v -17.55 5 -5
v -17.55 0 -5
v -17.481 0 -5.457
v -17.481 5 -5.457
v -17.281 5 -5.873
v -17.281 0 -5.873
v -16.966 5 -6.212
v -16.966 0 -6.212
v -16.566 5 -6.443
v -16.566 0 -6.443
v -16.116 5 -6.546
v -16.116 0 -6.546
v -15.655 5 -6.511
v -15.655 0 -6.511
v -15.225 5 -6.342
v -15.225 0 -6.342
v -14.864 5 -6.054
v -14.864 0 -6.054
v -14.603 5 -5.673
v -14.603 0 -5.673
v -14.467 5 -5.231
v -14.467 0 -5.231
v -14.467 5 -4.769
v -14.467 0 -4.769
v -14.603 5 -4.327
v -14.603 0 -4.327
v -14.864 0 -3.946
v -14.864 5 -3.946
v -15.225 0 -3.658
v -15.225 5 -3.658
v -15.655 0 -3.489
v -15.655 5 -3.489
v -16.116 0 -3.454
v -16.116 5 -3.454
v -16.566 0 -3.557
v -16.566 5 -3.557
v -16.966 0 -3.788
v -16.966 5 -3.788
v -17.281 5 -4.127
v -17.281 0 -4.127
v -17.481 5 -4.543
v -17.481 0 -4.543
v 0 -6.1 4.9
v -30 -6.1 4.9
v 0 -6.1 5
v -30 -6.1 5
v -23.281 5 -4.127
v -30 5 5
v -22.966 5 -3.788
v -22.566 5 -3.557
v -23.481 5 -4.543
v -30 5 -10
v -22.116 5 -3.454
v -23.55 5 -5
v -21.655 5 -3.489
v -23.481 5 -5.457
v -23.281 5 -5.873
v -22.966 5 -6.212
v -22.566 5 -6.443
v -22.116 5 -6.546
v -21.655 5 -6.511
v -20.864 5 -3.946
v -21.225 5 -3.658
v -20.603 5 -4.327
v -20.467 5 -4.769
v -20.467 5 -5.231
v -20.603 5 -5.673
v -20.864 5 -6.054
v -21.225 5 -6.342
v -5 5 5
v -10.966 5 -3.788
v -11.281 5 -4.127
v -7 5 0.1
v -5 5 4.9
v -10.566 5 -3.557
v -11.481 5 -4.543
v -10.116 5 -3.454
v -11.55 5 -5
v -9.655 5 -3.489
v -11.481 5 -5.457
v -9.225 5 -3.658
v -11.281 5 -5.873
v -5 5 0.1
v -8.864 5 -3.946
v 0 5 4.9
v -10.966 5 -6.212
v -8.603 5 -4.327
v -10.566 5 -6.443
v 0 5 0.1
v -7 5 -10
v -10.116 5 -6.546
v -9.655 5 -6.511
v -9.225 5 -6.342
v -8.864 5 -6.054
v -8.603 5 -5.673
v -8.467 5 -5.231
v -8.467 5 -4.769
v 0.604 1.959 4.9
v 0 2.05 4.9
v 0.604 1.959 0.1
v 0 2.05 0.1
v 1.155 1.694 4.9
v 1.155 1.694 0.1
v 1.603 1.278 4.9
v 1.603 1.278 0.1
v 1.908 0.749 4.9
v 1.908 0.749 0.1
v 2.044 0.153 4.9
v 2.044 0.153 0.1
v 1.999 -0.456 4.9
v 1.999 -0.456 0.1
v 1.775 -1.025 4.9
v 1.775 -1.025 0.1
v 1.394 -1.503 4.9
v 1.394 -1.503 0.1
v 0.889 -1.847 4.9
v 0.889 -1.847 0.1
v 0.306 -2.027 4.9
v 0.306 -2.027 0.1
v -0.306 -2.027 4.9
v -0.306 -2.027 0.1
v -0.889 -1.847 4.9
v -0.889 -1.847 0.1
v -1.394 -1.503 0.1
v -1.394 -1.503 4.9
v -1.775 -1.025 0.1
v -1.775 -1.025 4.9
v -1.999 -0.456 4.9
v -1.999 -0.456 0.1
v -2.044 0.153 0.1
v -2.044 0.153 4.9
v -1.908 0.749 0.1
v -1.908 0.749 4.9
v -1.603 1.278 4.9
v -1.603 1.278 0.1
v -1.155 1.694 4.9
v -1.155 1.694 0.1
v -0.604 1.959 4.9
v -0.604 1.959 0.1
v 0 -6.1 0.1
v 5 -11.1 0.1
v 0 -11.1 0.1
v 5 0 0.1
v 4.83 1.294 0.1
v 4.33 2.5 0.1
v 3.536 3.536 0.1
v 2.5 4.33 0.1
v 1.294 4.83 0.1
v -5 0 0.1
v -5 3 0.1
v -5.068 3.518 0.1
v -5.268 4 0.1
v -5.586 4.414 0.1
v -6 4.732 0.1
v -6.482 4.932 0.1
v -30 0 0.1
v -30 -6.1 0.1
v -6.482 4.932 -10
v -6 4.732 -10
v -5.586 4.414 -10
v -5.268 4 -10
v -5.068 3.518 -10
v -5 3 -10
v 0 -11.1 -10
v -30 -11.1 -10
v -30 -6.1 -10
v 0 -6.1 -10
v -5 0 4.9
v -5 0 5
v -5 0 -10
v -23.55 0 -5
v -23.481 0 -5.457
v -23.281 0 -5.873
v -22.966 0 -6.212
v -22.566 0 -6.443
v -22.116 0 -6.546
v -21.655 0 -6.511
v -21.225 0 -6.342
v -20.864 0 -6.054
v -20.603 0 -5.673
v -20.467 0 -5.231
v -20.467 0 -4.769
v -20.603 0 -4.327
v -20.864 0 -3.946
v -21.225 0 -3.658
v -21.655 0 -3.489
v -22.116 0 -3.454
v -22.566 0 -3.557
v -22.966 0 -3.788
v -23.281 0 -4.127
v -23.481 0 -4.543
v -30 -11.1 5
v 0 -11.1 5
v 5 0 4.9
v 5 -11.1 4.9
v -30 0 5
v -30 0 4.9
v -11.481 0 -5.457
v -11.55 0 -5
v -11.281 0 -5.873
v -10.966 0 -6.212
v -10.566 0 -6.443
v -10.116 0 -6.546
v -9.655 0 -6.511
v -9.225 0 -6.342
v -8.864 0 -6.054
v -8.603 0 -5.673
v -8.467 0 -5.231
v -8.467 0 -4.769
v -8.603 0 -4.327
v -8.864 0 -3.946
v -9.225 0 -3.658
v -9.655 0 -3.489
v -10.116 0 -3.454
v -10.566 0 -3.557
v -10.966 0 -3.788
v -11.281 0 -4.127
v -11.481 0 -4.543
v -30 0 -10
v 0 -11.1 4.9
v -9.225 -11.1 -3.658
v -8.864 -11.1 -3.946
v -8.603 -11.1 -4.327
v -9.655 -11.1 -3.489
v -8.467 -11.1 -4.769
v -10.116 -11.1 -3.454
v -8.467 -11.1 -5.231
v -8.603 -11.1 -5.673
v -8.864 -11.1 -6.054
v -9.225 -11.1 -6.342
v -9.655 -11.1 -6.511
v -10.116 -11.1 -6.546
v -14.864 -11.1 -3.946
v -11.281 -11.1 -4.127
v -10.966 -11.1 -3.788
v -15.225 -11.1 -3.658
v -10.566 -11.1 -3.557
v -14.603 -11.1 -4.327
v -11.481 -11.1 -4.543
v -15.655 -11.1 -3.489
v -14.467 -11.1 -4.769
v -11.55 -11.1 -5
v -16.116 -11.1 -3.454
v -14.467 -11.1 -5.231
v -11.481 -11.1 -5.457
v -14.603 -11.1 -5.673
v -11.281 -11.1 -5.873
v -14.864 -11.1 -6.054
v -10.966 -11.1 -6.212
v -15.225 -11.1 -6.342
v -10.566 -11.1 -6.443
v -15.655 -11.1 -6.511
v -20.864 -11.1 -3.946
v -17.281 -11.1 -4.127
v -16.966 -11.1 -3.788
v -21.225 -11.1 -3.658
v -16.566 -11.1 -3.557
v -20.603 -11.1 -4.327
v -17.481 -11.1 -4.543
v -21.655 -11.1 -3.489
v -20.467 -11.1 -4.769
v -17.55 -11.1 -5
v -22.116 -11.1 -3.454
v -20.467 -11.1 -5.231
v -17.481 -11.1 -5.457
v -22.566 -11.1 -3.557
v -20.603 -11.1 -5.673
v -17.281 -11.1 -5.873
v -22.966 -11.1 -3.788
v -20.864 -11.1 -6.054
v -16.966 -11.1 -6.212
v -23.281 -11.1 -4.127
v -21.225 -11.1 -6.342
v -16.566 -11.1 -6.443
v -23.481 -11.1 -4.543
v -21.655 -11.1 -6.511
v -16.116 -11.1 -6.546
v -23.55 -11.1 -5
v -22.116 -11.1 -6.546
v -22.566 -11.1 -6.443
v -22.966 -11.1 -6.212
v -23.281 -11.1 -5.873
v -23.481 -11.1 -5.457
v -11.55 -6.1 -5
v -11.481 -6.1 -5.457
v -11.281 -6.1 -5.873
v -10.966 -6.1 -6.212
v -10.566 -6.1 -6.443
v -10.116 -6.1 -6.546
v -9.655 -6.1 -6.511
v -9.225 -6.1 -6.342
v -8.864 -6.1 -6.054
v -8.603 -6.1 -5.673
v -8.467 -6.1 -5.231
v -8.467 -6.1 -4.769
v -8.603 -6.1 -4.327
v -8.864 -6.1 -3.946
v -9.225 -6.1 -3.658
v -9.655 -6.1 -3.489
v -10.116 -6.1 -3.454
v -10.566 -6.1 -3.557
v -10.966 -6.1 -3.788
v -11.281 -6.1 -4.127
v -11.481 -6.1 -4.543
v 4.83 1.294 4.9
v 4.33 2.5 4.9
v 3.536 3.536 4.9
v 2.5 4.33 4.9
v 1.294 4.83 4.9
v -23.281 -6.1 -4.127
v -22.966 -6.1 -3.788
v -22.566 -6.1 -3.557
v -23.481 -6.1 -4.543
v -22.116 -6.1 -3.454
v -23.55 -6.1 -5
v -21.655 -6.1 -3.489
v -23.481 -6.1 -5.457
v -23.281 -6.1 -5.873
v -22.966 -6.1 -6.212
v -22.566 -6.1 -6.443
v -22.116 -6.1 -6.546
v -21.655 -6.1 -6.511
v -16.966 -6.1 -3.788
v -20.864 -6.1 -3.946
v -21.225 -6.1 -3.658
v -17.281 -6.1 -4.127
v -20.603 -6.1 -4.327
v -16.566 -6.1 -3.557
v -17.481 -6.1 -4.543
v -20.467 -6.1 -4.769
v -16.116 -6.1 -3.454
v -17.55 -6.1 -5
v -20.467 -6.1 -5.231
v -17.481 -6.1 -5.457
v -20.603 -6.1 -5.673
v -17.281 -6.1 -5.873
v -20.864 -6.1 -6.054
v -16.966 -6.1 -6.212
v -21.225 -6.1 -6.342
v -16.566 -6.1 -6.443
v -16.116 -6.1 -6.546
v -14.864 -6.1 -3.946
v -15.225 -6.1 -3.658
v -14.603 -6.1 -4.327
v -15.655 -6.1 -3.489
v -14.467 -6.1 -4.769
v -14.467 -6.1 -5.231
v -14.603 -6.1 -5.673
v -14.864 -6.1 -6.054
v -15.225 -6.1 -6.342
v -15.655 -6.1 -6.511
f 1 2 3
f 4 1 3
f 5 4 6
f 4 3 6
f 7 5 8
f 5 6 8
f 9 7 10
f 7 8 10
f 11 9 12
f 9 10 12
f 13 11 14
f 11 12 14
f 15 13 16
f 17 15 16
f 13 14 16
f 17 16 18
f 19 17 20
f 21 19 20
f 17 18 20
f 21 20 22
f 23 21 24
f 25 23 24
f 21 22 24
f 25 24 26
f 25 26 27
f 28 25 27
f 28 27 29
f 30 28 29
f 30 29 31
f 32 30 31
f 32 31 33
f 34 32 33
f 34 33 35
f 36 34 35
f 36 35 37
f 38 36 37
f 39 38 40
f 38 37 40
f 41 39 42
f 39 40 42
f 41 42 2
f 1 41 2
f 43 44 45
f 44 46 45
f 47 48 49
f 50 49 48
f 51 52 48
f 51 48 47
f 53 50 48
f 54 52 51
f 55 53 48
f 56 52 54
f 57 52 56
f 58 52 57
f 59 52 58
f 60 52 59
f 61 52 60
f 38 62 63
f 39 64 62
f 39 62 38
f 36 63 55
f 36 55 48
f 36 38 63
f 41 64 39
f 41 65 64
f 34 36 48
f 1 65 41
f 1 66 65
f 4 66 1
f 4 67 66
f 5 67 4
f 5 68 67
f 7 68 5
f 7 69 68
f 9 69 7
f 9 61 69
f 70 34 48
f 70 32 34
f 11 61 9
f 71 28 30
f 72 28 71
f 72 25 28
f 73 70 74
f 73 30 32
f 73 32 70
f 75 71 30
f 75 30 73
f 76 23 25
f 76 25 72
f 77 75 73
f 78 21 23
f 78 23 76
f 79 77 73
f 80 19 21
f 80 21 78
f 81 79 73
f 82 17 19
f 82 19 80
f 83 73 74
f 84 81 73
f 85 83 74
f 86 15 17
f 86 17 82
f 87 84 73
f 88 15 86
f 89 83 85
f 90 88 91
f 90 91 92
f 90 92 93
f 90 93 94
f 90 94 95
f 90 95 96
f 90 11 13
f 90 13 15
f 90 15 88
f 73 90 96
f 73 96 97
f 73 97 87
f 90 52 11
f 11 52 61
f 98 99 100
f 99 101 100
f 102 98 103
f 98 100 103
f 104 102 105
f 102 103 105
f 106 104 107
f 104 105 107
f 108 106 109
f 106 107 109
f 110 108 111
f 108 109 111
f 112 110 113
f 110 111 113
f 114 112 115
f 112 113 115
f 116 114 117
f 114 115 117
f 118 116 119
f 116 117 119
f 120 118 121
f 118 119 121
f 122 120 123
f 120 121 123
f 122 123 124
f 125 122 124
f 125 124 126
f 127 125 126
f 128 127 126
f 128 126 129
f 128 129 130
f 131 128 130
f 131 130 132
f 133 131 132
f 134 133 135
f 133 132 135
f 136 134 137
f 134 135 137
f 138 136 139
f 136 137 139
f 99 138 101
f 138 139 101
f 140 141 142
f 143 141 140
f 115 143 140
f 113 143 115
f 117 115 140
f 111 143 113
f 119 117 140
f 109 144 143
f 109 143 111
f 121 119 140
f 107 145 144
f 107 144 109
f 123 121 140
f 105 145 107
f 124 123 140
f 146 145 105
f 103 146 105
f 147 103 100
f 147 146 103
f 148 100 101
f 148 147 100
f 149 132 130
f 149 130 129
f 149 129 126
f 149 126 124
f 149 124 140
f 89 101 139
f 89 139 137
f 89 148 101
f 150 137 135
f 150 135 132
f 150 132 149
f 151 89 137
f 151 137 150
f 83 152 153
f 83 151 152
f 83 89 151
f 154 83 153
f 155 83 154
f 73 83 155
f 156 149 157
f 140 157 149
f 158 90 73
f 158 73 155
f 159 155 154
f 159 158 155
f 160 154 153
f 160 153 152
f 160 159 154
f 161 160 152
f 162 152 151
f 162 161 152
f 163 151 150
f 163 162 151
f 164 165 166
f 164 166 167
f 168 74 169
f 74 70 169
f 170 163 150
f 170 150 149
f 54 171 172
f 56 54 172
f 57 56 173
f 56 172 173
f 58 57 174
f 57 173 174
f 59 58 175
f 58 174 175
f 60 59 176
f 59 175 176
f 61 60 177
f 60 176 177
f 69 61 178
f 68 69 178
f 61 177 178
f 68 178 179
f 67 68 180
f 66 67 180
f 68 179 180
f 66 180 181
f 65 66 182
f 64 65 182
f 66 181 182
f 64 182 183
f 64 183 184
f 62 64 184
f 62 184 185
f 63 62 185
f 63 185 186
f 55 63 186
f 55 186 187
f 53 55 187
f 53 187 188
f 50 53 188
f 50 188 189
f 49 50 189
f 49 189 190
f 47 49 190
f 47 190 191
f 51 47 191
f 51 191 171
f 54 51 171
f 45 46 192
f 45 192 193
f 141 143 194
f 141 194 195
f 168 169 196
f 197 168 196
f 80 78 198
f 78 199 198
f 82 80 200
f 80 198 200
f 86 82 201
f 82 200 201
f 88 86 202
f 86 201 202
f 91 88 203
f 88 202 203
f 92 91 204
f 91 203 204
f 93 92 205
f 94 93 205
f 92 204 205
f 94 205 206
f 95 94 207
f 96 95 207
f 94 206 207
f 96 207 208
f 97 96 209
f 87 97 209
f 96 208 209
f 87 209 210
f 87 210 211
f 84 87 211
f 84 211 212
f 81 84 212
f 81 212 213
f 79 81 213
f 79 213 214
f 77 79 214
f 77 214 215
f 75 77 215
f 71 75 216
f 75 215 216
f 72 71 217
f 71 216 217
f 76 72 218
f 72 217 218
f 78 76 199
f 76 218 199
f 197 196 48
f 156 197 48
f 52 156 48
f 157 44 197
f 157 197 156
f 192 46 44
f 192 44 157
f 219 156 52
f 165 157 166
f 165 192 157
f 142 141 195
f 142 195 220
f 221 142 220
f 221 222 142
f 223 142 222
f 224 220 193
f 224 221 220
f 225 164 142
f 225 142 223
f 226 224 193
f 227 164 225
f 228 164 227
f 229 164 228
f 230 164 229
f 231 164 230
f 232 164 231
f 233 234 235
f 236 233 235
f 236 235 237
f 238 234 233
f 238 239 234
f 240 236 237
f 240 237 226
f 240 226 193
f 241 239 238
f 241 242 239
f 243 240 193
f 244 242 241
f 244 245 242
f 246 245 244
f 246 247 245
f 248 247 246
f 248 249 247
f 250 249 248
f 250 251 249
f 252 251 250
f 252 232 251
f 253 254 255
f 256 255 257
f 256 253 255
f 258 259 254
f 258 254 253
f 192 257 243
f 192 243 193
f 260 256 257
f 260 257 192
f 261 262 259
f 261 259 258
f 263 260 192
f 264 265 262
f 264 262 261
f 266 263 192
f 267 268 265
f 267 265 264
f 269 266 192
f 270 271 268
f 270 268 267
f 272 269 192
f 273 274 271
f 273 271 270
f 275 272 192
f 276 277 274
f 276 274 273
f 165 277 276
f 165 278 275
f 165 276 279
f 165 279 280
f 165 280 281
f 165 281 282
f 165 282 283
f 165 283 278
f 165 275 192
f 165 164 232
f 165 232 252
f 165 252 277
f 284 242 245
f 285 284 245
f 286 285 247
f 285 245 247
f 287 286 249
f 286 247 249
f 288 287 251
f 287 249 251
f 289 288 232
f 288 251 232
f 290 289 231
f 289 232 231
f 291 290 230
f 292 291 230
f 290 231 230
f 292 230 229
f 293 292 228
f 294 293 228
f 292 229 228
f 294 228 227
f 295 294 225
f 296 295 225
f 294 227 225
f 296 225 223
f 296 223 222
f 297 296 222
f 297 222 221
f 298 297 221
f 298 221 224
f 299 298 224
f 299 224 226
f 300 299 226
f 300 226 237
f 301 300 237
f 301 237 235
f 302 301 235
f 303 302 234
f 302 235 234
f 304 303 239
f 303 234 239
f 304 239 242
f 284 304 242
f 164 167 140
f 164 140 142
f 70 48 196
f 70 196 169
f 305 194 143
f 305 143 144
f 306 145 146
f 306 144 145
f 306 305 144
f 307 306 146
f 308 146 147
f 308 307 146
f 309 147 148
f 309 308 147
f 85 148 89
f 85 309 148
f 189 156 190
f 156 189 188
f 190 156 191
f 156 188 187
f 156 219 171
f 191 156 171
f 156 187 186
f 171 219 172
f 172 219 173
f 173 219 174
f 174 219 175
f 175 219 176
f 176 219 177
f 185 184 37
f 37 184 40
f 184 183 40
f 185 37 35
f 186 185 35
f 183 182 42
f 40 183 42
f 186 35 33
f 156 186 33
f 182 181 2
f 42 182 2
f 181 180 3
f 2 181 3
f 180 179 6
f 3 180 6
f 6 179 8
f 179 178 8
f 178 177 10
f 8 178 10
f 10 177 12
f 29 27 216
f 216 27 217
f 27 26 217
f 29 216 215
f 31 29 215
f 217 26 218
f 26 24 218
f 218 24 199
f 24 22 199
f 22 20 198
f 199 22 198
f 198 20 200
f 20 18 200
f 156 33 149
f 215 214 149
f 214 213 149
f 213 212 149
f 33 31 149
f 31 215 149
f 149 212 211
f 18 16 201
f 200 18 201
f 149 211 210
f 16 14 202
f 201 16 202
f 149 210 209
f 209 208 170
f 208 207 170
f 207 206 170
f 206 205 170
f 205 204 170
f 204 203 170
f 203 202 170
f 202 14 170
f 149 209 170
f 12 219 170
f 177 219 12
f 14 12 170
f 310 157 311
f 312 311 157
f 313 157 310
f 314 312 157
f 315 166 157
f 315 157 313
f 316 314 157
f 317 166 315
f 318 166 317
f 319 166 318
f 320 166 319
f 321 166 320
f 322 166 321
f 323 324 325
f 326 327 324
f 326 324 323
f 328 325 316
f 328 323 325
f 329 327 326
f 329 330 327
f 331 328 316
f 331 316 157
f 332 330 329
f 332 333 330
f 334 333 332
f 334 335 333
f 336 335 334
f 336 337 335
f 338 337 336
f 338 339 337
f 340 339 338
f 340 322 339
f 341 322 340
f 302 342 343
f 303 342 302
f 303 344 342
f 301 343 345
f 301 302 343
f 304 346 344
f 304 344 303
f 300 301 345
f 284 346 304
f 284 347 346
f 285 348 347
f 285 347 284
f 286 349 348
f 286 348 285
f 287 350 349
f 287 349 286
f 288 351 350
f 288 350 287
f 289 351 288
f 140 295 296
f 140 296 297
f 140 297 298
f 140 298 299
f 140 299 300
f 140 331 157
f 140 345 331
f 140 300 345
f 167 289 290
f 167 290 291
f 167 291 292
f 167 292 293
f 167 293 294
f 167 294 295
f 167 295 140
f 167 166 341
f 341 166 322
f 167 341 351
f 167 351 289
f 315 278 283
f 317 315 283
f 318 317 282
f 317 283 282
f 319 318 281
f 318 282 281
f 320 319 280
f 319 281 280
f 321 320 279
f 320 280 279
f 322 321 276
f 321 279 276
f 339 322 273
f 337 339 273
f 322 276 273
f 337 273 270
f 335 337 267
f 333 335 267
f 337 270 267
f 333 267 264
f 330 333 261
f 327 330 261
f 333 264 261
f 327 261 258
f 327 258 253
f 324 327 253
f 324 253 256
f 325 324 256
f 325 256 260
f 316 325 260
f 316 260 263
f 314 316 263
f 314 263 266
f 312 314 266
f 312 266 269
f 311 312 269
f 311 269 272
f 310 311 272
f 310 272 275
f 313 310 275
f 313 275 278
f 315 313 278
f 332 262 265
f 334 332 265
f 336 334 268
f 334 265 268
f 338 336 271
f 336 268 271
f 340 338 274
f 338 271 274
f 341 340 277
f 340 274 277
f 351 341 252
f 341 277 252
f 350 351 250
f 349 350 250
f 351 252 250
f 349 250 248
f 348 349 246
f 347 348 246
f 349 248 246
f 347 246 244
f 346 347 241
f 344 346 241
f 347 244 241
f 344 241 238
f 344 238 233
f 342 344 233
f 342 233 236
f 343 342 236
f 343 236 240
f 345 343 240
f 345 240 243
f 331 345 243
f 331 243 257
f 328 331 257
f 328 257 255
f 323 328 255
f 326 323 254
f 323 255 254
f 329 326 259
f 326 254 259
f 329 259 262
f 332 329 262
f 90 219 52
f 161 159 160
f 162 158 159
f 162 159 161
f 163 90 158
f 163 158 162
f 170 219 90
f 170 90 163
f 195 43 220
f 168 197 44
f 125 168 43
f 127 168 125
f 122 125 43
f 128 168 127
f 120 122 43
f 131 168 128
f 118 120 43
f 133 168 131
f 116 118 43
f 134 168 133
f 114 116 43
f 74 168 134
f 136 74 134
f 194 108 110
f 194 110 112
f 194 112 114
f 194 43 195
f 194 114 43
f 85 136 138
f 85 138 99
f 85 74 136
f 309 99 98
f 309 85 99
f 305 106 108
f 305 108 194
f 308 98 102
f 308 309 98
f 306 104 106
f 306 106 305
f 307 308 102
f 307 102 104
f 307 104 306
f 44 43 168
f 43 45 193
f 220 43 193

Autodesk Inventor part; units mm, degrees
ref_plane "YZ Plane" through (0, 0, 0) normal (1, 0, 0) x (0, 1, 0)
ref_plane "XZ Plane" through (0, 0, 0) normal (0, 1, 0) x (-1, 0, 0)
ref_plane "XY Plane" through (0, 0, 0) normal (0, 0, 1) x (1, 0, 0)
sketch "Sketch2" plane through (0, 0, 0) normal (0, 1, 0) x (-1, 0, 0)
  line L0 (0, 0) -> (30, 0)
  line L1 (30, 0) -> (30, -10)
  line L2 (30, -10) -> (0, -10)
  line L3 (0, -10) -> (0, 0)
  circle A0 centre (10, -5) radius 1.55
  dimension "d0" = 3.1
  dimension "d1" = 10
  dimension "d2" = 5
  dimension "d3" = 30
  dimension "d4" = 10
extrude "Extrusion1" add sketch "Sketch2" along normal blind 5 contours L0 L1 L2 L3 | A0
extrude "Extrusion2" cut sketch "Sketch2" along normal blind 10 contours A0
pattern_linear "Rectangular Pattern1" count 3 spacing 6 along (-1, 0, 0) of "Extrusion2"
pattern_linear "Rectangular Pattern2" count 2 spacing 11.1 along (0, -1, 0) of "Extrusion1", "Extrusion2", "Rectangular Pattern1"
sketch "Sketch3" plane through (-30, 0, 0) normal (0, 0, 1) x (1, 0, 0)
  line L0 (0, 0) -> (0, 5) projected
  line L1 (0, 5) -> (30, 5) projected
  line L2 (30, 5) -> (30, 0) projected
  line L3 (30, 0) -> (0, 0) projected
  line L4 (0, -11.1) -> (0, -6.1) projected
  line L5 (0, -6.1) -> (30, -6.1) projected
  line L6 (30, -6.1) -> (30, -11.1) projected
  line L7 (30, -11.1) -> (0, -11.1) projected
  line L8 (0, 5) -> (30, 5) projected
  line L9 (0, 5) -> (30, 5)
  line L10 (30, 5) -> (30, -11.1)
  line L11 (30, -11.1) -> (0, -11.1)
  line L12 (0, -11.1) -> (0, 5)
  line L13 (0, 0) -> (30, 0) projected
  circle A0 centre (30, 0) radius 2.05
  line L14 (25, 5) -> (35, 5)
  line L15 (35, 5) -> (35, -11.1)
  line L16 (35, -11.1) -> (25, -11.1)
  line L17 (25, -11.1) -> (25, 5)
  line L18 (0, -11.1) -> (30, -11.1) projected
  point P0 (30, 2.05)
  point P1 (30, -2.05)
  dimension "d28" = 4.1
  dimension "d29" = 10
  dimension "d31" = 5
extrude "Extrusion3" add sketch "Sketch3" along normal blind 5 contours L0 L1 L17 L3 | L3 L17 L5 L12 | L17 L1 L2 A0 L3 | L3 A0 L10 L5 L17 | L5 L17 L7 L4 | A0 L2 L3 | L3 L10 A0 | L5 L6 L7 L17
extrude "Extrusion4" add sketch "Sketch3" along normal blind 5 contours L14 L15 L16 L6 L10 A0 L2
extrude "Extrusion5" cut sketch "Sketch3" along normal mid plane 100 contours A0 L2 L3 | L3 L10 A0
sketch "Sketch4" plane through (0, 5, -10) normal (0, 0, -1) x (-1, 0, 0)
  line L0 (0, 0) -> (5, 0)
  line L1 (5, 0) -> (5, -5)
  line L2 (5, -5) -> (0, -5)
  line L3 (0, -5) -> (0, 0)
  line L4 (2.05, -5) -> (30, -5) projected
  point P0 (0, -5)
  dimension "d32" = 5
extrude "Extrusion6" cut sketch "Sketch4" against normal blind 10
fillet "Fillet1" radius 5 1 edges at (5, 5, 2.5)
sketch "Sketch5" plane through (-30, 0, 0) normal (0, 0, -1) x (-1, 0, 0)
  arc A0 (-30, 5) -> (-35, 0) centre (-30, 0) ccw projected
  line L0 (-35, -11.1) -> (-35, 0) projected
  line L1 (-30, -11.1) -> (-35, -11.1) projected
  line L2 (-30, -6.1) -> (-30, -11.1) projected
  line L3 (0, -6.1) -> (-30, -6.1) projected
  line L4 (0, 0) -> (0, -6.1) projected
  line L5 (0, 0) -> (-25, 0) projected
  line L6 (-25, 5) -> (-25, 0) projected
  line L7 (-30, 5) -> (-25, 5) projected
  circle A1 centre (-30, 0) radius 2.05 projected
  line L8 (-25, 0) -> (-25, -6.1)
  line L9 (0, -6.1) -> (-30, -6.1) projected
extrude "Extrusion7" cut sketch "Sketch5" against normal blind 0.1
sketch "Sketch6" plane through (-30, 0, 5) normal (0, 0, 1) x (1, 0, 0)
  line L0 (0, -6.1) -> (30, -6.1) projected
  line L1 (25, 5) -> (25, 0) projected
  line L2 (30, 5) -> (25, 5) projected
  arc A0 (35, 0) -> (30, 5) centre (30, 0) ccw projected
  line L3 (35, -11.1) -> (35, 0) projected
  line L4 (30, -11.1) -> (35, -11.1) projected
  line L5 (30, -6.1) -> (30, -11.1) projected
  circle A1 centre (30, 0) radius 2.05 projected
  line L6 (0, 0) -> (0, -6.1) projected
  line L7 (25, 0) -> (0, 0) projected
extrude "Extrusion8" cut sketch "Sketch6" against normal blind 0.1
fillet "Fillet2" radius 2 1 edges at (-5, 5, -4.95)
properties part number "Bending_hinge"
